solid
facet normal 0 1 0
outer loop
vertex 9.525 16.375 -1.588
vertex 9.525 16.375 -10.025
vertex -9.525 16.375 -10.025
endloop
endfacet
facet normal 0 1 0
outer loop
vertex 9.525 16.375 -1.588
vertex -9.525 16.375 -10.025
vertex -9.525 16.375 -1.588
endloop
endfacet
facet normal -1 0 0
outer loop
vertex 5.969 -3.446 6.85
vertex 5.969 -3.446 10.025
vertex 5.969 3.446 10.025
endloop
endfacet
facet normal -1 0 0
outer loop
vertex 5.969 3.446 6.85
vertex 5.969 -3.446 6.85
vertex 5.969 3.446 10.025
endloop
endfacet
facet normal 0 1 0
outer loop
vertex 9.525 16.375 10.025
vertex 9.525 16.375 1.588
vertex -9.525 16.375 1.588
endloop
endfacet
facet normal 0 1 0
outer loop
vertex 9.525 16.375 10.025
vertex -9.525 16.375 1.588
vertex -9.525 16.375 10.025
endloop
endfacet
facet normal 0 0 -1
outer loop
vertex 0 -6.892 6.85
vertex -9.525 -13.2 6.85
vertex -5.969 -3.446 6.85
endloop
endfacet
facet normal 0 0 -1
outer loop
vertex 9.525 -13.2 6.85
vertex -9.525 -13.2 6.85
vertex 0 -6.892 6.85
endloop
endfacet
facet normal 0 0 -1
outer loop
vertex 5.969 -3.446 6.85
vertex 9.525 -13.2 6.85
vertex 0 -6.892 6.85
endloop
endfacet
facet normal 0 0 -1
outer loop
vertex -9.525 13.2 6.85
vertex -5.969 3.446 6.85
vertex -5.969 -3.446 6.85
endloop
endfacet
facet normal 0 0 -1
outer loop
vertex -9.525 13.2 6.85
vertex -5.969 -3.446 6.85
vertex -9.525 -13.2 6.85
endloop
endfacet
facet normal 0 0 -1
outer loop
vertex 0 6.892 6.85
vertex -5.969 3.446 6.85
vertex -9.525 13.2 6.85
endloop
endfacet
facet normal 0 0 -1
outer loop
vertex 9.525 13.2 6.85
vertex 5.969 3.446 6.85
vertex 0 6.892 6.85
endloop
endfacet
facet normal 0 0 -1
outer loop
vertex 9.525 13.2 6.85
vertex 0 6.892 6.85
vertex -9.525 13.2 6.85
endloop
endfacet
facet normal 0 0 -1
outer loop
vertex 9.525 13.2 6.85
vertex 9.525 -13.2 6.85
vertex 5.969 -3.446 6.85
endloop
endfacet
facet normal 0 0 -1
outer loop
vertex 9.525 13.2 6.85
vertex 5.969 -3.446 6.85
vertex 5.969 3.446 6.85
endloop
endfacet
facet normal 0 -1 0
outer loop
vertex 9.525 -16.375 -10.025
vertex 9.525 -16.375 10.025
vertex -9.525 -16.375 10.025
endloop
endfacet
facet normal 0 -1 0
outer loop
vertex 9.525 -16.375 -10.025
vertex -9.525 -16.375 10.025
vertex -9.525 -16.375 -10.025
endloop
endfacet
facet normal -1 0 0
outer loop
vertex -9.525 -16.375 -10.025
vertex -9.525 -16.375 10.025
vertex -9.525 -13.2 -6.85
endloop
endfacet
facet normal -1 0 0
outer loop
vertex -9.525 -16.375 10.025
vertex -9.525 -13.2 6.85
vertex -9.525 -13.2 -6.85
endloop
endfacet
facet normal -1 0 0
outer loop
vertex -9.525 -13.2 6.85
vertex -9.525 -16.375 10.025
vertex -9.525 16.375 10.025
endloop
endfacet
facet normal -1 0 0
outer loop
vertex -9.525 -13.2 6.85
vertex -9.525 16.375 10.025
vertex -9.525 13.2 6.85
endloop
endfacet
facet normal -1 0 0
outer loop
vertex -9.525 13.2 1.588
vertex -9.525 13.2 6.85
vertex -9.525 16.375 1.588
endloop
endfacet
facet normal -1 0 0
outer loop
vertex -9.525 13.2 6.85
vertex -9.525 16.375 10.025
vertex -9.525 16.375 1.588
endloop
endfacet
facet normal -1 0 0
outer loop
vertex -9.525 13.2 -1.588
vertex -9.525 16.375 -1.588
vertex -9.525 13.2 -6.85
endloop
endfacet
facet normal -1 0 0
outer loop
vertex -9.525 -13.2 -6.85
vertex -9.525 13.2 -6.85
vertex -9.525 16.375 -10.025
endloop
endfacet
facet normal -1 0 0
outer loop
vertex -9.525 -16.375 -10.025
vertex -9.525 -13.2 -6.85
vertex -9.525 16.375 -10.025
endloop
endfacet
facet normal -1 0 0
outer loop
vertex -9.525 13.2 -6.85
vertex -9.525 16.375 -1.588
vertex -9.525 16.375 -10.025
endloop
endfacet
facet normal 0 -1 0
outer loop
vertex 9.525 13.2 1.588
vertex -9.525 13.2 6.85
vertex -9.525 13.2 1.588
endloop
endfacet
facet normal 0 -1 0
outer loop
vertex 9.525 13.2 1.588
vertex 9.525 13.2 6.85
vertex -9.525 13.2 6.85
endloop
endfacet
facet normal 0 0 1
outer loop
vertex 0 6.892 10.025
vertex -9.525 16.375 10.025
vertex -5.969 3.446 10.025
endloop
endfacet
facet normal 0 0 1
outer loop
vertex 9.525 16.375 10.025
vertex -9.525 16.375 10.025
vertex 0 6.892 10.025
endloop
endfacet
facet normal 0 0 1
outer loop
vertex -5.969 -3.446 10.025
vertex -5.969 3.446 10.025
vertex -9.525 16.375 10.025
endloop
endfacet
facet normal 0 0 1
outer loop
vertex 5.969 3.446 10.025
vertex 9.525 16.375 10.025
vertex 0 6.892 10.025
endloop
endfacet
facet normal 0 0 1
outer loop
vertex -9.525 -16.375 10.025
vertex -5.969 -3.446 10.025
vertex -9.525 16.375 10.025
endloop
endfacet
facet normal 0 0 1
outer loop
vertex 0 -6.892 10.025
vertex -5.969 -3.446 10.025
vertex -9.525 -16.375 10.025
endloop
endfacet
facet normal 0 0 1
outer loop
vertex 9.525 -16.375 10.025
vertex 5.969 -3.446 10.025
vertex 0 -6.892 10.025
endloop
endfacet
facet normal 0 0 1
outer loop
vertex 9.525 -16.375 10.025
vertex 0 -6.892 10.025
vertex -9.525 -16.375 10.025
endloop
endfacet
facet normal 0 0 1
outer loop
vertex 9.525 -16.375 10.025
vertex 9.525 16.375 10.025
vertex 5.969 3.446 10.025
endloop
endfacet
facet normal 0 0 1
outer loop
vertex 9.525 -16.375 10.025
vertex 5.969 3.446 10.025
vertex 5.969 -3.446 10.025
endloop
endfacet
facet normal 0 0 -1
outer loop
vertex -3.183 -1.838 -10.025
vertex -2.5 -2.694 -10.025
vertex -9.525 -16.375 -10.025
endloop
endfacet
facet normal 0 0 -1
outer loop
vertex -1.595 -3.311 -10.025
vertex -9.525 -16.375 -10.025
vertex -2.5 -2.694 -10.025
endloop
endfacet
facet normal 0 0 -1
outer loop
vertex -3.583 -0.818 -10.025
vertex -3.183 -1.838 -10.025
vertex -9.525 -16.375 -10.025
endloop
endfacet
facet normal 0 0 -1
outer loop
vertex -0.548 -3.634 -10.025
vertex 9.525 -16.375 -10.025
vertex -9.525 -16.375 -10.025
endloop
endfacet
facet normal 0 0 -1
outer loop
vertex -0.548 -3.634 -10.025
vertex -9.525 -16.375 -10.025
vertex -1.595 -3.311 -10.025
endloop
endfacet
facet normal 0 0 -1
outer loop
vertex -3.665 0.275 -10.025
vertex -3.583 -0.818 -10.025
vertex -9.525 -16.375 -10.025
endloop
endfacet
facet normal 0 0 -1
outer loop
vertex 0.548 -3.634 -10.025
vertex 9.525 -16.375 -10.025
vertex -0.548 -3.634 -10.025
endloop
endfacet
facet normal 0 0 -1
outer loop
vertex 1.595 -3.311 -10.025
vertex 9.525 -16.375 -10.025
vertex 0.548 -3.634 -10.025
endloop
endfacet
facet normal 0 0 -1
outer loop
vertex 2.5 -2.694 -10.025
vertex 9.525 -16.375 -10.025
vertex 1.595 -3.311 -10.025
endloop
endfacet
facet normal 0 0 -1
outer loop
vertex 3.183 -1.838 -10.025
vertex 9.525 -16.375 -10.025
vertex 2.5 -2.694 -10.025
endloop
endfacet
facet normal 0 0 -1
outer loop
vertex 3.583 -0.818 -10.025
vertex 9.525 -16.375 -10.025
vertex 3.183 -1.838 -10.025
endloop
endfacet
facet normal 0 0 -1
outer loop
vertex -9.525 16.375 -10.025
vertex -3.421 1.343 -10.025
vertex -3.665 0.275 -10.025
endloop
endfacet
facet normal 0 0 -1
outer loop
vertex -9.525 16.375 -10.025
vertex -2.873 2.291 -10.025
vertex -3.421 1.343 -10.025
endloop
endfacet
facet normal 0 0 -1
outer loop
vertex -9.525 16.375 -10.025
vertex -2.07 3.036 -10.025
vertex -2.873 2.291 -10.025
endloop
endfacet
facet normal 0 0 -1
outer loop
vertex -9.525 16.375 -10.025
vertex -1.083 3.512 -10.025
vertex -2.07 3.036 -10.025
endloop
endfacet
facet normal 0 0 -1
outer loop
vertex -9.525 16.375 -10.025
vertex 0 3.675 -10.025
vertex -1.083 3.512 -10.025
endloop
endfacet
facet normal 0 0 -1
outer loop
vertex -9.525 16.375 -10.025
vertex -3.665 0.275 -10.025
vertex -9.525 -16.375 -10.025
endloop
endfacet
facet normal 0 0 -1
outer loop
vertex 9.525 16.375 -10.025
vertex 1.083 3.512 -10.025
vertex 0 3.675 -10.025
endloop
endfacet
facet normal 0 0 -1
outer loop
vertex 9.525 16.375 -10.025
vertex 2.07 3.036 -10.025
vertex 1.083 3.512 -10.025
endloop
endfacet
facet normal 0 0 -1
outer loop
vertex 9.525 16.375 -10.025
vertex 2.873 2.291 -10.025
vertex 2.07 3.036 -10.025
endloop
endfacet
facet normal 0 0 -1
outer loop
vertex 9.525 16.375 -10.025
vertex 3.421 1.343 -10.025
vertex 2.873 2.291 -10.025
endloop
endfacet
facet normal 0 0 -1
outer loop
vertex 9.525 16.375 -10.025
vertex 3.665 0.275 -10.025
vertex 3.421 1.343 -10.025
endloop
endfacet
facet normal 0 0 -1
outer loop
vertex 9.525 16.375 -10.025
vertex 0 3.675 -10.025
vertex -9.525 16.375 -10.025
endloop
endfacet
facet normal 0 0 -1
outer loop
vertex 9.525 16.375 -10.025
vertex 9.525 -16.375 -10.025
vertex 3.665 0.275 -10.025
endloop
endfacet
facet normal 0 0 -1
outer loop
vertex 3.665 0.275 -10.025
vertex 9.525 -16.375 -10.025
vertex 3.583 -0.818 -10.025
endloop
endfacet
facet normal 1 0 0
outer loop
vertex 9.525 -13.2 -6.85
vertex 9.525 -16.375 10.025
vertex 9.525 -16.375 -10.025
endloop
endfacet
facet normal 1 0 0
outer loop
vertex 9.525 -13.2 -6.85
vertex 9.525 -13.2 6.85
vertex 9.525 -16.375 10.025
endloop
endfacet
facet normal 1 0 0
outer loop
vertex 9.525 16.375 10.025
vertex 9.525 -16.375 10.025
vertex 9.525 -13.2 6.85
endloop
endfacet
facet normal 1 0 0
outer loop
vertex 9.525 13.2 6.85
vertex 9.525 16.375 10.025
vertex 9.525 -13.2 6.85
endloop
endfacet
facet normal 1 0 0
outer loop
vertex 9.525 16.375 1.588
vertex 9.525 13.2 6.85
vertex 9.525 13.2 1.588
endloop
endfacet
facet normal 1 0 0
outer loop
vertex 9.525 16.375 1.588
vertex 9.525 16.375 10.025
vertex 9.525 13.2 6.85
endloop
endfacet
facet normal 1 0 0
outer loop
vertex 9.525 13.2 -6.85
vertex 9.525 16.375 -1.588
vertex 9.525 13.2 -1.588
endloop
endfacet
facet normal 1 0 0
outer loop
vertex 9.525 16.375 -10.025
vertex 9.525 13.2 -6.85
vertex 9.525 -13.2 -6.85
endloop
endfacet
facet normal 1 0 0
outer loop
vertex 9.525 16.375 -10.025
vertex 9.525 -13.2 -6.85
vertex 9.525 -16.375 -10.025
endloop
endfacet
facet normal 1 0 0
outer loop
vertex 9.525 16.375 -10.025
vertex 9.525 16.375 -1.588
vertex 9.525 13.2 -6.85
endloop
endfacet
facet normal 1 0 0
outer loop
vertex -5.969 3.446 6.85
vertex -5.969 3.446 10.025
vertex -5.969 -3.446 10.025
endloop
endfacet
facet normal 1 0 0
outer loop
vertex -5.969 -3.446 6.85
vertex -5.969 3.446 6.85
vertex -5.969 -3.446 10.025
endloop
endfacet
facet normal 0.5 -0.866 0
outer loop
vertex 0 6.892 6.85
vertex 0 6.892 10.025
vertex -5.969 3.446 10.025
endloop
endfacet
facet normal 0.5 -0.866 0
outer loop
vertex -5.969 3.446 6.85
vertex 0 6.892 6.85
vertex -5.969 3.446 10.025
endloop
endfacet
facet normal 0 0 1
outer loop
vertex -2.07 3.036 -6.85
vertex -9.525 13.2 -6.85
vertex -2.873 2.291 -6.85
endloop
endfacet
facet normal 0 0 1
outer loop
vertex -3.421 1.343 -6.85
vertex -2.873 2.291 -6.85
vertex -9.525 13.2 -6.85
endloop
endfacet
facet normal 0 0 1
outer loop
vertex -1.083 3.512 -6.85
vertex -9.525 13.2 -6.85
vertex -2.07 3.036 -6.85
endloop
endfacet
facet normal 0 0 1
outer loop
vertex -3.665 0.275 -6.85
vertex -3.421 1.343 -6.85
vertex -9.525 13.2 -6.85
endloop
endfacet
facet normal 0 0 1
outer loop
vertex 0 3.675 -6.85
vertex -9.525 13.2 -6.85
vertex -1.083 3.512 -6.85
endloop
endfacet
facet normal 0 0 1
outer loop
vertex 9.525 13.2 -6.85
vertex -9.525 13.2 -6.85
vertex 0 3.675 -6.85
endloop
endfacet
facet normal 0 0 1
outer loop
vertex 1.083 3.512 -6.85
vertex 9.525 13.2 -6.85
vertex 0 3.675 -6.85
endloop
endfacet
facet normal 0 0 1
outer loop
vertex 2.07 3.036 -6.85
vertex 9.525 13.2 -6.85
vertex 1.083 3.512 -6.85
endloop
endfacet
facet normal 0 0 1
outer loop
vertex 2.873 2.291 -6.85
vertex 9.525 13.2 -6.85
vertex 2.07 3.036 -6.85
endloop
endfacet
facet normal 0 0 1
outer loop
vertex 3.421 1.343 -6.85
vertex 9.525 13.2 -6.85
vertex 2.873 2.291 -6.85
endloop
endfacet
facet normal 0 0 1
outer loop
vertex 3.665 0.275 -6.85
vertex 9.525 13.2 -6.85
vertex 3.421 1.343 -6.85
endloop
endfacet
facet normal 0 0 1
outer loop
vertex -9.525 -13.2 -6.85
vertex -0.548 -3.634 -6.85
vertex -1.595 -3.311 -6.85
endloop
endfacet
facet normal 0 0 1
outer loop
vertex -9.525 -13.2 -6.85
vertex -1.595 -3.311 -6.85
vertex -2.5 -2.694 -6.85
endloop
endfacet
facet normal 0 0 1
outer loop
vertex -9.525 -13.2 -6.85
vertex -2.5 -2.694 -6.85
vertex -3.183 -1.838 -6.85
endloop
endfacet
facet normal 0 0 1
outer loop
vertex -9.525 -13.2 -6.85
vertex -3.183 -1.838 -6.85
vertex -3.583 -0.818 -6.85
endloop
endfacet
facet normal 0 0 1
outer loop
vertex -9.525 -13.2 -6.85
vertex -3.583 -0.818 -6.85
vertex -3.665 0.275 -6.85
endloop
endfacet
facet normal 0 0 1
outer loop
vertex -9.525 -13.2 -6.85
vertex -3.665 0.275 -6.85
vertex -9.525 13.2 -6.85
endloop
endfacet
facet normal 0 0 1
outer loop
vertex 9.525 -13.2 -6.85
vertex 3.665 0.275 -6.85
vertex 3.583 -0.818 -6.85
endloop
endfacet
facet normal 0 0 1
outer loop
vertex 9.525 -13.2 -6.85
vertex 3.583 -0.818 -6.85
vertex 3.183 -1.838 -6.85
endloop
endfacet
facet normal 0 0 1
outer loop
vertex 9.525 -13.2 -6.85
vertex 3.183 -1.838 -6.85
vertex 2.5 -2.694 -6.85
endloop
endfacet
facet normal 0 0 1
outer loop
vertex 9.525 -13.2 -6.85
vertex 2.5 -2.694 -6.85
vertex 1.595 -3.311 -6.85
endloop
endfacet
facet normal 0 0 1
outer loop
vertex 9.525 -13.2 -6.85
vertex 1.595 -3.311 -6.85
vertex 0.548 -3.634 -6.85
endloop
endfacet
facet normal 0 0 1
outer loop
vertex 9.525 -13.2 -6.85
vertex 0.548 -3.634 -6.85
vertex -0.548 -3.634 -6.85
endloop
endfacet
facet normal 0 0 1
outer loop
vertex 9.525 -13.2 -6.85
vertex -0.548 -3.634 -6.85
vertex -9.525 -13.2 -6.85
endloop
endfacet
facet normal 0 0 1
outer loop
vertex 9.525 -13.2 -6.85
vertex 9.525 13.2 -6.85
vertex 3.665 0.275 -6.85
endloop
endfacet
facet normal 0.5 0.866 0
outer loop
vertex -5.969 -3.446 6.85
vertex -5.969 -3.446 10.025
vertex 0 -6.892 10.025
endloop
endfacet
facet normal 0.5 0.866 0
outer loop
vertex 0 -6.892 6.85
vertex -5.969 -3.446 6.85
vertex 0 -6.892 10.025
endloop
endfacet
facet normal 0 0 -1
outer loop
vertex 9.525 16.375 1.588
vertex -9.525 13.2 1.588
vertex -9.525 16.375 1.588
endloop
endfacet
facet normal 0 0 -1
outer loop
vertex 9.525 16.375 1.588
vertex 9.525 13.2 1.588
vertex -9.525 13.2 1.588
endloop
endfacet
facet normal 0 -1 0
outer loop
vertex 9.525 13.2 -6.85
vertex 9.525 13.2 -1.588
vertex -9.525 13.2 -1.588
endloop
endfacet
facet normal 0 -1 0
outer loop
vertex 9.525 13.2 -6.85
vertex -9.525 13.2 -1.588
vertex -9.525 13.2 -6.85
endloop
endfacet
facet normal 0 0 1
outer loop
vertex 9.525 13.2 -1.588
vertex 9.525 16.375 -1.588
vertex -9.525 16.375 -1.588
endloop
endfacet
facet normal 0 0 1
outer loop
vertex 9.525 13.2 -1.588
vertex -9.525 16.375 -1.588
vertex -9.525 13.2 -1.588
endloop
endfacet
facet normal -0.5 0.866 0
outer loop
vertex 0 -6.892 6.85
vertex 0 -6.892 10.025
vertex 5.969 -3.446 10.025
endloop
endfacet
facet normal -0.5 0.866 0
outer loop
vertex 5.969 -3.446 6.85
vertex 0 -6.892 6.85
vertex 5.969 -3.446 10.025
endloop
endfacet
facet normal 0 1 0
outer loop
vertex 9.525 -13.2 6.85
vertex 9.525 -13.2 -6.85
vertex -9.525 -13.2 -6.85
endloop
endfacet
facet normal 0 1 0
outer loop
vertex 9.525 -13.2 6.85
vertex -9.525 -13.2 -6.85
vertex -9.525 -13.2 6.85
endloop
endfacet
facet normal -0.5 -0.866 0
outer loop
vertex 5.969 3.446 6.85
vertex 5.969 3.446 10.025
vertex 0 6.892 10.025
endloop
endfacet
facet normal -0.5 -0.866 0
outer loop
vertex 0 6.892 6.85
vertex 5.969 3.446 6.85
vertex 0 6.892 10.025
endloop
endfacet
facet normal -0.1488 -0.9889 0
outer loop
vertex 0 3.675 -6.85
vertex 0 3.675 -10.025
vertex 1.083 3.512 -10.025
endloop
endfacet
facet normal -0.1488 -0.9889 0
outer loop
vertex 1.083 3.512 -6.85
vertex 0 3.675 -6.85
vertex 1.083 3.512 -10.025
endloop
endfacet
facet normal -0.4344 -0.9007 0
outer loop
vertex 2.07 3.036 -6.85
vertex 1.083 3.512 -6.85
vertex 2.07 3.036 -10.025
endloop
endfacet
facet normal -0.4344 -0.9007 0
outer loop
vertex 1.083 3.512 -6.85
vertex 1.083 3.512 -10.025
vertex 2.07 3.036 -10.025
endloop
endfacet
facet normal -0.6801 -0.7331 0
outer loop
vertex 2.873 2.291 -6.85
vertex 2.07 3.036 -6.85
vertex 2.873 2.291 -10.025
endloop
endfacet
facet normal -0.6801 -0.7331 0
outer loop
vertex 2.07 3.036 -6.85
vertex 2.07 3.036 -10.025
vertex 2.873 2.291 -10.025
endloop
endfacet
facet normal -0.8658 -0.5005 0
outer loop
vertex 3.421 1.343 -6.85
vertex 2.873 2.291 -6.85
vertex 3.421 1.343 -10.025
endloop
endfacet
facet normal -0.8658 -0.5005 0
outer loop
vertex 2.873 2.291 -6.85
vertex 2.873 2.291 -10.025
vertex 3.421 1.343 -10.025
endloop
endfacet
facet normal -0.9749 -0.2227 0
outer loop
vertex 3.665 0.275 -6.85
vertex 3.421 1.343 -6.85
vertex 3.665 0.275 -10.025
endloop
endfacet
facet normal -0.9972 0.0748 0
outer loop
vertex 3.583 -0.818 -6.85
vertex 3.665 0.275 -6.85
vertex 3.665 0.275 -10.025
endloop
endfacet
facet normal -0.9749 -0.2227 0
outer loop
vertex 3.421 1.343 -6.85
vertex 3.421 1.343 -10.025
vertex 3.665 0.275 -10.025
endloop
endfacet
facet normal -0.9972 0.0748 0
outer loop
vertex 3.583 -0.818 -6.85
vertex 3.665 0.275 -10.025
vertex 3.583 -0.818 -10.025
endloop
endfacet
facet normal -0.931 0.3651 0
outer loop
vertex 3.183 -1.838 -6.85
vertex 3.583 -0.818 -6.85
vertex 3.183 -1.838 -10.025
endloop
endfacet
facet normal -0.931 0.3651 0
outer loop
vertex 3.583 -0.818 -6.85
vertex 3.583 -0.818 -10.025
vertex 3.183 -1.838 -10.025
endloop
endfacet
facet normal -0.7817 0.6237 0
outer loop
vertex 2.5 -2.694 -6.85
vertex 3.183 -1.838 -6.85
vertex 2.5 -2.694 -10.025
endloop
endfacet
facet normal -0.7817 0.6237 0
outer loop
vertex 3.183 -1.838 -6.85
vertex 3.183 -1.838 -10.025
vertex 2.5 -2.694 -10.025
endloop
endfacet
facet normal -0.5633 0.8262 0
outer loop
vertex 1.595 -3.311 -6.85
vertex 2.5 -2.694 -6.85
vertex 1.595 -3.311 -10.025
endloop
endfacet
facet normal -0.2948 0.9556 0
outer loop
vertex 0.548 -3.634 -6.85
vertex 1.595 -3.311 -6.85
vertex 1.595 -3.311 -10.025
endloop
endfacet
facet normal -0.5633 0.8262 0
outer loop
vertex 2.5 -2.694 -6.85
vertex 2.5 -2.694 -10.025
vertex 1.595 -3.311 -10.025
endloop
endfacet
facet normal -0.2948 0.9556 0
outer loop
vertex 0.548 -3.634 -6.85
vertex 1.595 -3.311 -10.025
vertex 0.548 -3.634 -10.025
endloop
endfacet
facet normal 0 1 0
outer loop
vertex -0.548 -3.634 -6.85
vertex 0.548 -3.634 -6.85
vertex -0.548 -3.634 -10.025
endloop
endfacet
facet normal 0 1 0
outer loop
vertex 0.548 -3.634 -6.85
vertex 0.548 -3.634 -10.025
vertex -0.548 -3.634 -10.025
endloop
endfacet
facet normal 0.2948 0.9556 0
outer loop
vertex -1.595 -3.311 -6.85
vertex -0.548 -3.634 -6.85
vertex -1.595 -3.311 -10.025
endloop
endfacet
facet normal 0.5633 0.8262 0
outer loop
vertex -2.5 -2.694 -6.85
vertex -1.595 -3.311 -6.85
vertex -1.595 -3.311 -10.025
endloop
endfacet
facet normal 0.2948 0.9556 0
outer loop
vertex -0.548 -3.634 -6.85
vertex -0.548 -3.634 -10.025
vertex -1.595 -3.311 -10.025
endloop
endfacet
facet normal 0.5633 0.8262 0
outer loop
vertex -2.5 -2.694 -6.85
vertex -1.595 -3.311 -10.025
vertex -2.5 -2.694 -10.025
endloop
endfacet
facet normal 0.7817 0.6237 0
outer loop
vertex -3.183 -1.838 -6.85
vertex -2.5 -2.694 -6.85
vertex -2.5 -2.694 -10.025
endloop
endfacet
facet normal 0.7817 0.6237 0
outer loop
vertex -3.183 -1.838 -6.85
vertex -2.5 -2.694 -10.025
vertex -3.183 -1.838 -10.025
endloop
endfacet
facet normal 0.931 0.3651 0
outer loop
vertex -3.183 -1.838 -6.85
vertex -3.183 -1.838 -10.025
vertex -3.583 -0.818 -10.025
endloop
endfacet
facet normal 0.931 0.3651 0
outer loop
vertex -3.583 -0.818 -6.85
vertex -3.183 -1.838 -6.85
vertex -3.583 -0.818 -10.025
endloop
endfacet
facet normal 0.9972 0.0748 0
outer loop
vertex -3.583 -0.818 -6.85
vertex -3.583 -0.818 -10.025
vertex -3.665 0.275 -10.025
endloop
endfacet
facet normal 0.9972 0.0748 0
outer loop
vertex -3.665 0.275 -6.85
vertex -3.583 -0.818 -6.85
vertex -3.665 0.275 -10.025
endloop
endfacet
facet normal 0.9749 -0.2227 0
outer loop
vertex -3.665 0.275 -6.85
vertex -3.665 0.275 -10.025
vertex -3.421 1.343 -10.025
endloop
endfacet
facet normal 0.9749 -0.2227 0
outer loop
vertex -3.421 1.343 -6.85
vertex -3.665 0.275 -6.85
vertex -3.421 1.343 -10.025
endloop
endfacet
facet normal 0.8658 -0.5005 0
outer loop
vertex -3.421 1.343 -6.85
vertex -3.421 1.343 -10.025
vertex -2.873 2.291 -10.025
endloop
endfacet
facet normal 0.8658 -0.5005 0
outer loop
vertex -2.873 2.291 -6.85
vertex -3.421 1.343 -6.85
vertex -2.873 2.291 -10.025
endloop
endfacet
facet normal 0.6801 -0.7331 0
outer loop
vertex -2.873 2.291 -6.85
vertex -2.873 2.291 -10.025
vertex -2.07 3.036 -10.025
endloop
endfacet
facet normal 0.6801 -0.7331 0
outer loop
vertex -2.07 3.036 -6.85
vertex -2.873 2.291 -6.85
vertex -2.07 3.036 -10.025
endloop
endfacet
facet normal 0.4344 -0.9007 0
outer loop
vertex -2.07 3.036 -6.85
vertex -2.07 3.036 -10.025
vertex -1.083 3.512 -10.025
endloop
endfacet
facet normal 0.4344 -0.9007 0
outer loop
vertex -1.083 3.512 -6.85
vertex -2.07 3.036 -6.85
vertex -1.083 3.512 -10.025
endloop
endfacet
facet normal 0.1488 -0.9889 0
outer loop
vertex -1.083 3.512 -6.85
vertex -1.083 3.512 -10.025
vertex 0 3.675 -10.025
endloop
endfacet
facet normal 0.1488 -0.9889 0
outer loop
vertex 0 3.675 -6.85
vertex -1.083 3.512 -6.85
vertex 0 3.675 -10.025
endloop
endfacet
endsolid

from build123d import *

# Parameters (mm, degrees)
TOP_START                      = -3.123265701
TOP_BAR_CUT_EXTRUDE1_OUTLINE_W = 203.2
TOP_BAR_CUT_EXTRUDE1_OUTLINE_H = 25.4
TOP_BAR_CUT_EXTRUDE1_DEPTH     = 12.7
TOP_START_2                    = 6.35
TOP_BAR_OUTLINE_W              = 203.2
TOP_BAR_OUTLINE_H              = 25.4
TOP_BAR_DEPTH                  = 3.226734299
TOP_BAR_2_DEPTH                = 9.473265701
TOP_START_3                    = -6.35
TOP_BAR_3_OUTLINE_W            = 203.2
TOP_BAR_3_OUTLINE_H            = 25.4
TOP_BAR_3_DEPTH                = 12.7
BOSS_EXTRUDE2_DEPTH            = 9.525
SKETCH4_R                      = 3.675
CUT_EXTRUDE1_DEPTH             = 28.583849441
CUT_EXTRUDE2_DEPTH             = 3.175


# Read off the part's stored shape, not the designer's step: <top bar>-<Cut-Extrude1>, top bar
with BuildPart() as part:
    # <top bar>-<Cut-Extrude1> outline → <top bar>-<Cut-Extrude1> (new body)
    with BuildSketch(Plane.XY.offset(TOP_START)):
        with Locations((-0.022421442, 2.056236138)):
            Rectangle(TOP_BAR_CUT_EXTRUDE1_OUTLINE_W, TOP_BAR_CUT_EXTRUDE1_OUTLINE_H)
        with BuildLine():
            ThreePointArc((-95.272421442, -1.618763862), (-98.947421442, 2.056236138), (-95.272421442, 5.731236138))
            Line((-95.272421442, 5.731236138), (6.327578558, 5.731236138))
            ThreePointArc((6.327578558, 5.731236138), (10.002578558, 2.056236138), (6.327578558, -1.618763862))
            Line((6.327578558, -1.618763862), (-95.272421442, -1.618763862))
        make_face(mode=Mode.SUBTRACT)
    extrude(amount=TOP_BAR_CUT_EXTRUDE1_DEPTH)

    # top bar outline → top bar (cut)
    with BuildSketch(Plane.XY.offset(TOP_START_2)):
        with Locations((-0.022421442, 2.056236138)):
            Rectangle(TOP_BAR_OUTLINE_W, TOP_BAR_OUTLINE_H)
        with BuildLine():
            ThreePointArc((6.327578558, 5.731236138), (10.002578558, 2.056236138), (6.327578558, -1.618763862))
            Line((6.327578558, -1.618763862), (-95.272421442, -1.618763862))
            ThreePointArc((-95.272421442, -1.618763862), (-98.947421442, 2.056236138), (-95.272421442, 5.731236138))
            Line((-95.272421442, 5.731236138), (6.327578558, 5.731236138))
        make_face(mode=Mode.SUBTRACT)
    extrude(amount=TOP_BAR_DEPTH, mode=Mode.SUBTRACT)

    # top bar 2 outline → top bar 2 (cut)
    with BuildSketch(Plane.XY.offset(TOP_START)):
        Polygon((-101.6, 12.7), (101.577578558, 12.7), (101.577578558, 14.756236138), (-101.622421442, 14.756236138), (-101.622421442, -10.643763862), (-101.6, -10.643763862), align=None)
        with BuildLine():
            ThreePointArc((-95.272421442, -1.618763862), (-97.461703705, -0.895486778), (-98.789240286, 0.989648017))
            ThreePointArc((-98.789240286, 0.989648017), (-98.177676678, -2.221336145), (-95.25, -3.675))
            Line((-95.25, -3.675), (6.35, -3.675))
            ThreePointArc((6.35, -3.675), (9.301722916, -2.189282263), (9.866818844, 1.066588121))
            ThreePointArc((9.866818844, 1.066588121), (8.548914703, -0.87144054), (6.327578558, -1.618763862))
            Line((6.327578558, -1.618763862), (-95.272421442, -1.618763862))
        make_face()
    extrude(amount=TOP_BAR_2_DEPTH, mode=Mode.SUBTRACT)

    # top bar 3 outline → top bar 3 (add)
    with BuildSketch(Plane.XY.offset(TOP_START_3)):
        Rectangle(TOP_BAR_3_OUTLINE_W, TOP_BAR_3_OUTLINE_H)
        with BuildLine():
            ThreePointArc((-95.25, -3.675), (-98.925, 0), (-95.25, 3.675))
            Line((-95.25, 3.675), (6.35, 3.675))
            ThreePointArc((6.35, 3.675), (10.025, 0), (6.35, -3.675))
            Line((6.35, -3.675), (-95.25, -3.675))
        make_face(mode=Mode.SUBTRACT)
    extrude(amount=TOP_BAR_3_DEPTH)


with BuildPart() as body_2:
    # Sketch3 → Boss-Extrude2 (new, symmetric)
    with BuildSketch(Plane(origin=(0, 0, 0), x_dir=(0, 0, -1), z_dir=(1, 0, 0))):
        Polygon((-1.5875, 13.2), (-1.5875, 16.375), (-10.025, 16.375), (-10.025, -16.375), (10.025, -16.375), (10.025, 16.375), (1.5875, 16.375), (1.5875, 13.2), (6.85, 13.2), (6.85, -13.2), (-6.85, -13.2), (-6.85, 13.2), align=None)
    extrude(amount=BOSS_EXTRUDE2_DEPTH, both=True)

    # Sketch4 → Cut-Extrude1 (cut, through all)
    with BuildSketch(Plane(origin=(0, 0, -10.025), x_dir=(-1, 0, 0), z_dir=(0, 0, -1))):
        with Locations(Location((0, 0, 0), (0, 0, 90))):
            Circle(SKETCH4_R)
    extrude(amount=-CUT_EXTRUDE1_DEPTH, mode=Mode.SUBTRACT)

    # Sketch5 → Cut-Extrude2 (cut)
    with BuildSketch(Plane.XY.offset(10.025)):
        Polygon((0, 6.892407514), (-5.969, 3.446203757), (-5.969, -3.446203757), (0, -6.892407514), (5.969, -3.446203757), (5.969, 3.446203757), align=None)
    extrude(amount=-CUT_EXTRUDE2_DEPTH, mode=Mode.SUBTRACT)


solid = body_2.part
